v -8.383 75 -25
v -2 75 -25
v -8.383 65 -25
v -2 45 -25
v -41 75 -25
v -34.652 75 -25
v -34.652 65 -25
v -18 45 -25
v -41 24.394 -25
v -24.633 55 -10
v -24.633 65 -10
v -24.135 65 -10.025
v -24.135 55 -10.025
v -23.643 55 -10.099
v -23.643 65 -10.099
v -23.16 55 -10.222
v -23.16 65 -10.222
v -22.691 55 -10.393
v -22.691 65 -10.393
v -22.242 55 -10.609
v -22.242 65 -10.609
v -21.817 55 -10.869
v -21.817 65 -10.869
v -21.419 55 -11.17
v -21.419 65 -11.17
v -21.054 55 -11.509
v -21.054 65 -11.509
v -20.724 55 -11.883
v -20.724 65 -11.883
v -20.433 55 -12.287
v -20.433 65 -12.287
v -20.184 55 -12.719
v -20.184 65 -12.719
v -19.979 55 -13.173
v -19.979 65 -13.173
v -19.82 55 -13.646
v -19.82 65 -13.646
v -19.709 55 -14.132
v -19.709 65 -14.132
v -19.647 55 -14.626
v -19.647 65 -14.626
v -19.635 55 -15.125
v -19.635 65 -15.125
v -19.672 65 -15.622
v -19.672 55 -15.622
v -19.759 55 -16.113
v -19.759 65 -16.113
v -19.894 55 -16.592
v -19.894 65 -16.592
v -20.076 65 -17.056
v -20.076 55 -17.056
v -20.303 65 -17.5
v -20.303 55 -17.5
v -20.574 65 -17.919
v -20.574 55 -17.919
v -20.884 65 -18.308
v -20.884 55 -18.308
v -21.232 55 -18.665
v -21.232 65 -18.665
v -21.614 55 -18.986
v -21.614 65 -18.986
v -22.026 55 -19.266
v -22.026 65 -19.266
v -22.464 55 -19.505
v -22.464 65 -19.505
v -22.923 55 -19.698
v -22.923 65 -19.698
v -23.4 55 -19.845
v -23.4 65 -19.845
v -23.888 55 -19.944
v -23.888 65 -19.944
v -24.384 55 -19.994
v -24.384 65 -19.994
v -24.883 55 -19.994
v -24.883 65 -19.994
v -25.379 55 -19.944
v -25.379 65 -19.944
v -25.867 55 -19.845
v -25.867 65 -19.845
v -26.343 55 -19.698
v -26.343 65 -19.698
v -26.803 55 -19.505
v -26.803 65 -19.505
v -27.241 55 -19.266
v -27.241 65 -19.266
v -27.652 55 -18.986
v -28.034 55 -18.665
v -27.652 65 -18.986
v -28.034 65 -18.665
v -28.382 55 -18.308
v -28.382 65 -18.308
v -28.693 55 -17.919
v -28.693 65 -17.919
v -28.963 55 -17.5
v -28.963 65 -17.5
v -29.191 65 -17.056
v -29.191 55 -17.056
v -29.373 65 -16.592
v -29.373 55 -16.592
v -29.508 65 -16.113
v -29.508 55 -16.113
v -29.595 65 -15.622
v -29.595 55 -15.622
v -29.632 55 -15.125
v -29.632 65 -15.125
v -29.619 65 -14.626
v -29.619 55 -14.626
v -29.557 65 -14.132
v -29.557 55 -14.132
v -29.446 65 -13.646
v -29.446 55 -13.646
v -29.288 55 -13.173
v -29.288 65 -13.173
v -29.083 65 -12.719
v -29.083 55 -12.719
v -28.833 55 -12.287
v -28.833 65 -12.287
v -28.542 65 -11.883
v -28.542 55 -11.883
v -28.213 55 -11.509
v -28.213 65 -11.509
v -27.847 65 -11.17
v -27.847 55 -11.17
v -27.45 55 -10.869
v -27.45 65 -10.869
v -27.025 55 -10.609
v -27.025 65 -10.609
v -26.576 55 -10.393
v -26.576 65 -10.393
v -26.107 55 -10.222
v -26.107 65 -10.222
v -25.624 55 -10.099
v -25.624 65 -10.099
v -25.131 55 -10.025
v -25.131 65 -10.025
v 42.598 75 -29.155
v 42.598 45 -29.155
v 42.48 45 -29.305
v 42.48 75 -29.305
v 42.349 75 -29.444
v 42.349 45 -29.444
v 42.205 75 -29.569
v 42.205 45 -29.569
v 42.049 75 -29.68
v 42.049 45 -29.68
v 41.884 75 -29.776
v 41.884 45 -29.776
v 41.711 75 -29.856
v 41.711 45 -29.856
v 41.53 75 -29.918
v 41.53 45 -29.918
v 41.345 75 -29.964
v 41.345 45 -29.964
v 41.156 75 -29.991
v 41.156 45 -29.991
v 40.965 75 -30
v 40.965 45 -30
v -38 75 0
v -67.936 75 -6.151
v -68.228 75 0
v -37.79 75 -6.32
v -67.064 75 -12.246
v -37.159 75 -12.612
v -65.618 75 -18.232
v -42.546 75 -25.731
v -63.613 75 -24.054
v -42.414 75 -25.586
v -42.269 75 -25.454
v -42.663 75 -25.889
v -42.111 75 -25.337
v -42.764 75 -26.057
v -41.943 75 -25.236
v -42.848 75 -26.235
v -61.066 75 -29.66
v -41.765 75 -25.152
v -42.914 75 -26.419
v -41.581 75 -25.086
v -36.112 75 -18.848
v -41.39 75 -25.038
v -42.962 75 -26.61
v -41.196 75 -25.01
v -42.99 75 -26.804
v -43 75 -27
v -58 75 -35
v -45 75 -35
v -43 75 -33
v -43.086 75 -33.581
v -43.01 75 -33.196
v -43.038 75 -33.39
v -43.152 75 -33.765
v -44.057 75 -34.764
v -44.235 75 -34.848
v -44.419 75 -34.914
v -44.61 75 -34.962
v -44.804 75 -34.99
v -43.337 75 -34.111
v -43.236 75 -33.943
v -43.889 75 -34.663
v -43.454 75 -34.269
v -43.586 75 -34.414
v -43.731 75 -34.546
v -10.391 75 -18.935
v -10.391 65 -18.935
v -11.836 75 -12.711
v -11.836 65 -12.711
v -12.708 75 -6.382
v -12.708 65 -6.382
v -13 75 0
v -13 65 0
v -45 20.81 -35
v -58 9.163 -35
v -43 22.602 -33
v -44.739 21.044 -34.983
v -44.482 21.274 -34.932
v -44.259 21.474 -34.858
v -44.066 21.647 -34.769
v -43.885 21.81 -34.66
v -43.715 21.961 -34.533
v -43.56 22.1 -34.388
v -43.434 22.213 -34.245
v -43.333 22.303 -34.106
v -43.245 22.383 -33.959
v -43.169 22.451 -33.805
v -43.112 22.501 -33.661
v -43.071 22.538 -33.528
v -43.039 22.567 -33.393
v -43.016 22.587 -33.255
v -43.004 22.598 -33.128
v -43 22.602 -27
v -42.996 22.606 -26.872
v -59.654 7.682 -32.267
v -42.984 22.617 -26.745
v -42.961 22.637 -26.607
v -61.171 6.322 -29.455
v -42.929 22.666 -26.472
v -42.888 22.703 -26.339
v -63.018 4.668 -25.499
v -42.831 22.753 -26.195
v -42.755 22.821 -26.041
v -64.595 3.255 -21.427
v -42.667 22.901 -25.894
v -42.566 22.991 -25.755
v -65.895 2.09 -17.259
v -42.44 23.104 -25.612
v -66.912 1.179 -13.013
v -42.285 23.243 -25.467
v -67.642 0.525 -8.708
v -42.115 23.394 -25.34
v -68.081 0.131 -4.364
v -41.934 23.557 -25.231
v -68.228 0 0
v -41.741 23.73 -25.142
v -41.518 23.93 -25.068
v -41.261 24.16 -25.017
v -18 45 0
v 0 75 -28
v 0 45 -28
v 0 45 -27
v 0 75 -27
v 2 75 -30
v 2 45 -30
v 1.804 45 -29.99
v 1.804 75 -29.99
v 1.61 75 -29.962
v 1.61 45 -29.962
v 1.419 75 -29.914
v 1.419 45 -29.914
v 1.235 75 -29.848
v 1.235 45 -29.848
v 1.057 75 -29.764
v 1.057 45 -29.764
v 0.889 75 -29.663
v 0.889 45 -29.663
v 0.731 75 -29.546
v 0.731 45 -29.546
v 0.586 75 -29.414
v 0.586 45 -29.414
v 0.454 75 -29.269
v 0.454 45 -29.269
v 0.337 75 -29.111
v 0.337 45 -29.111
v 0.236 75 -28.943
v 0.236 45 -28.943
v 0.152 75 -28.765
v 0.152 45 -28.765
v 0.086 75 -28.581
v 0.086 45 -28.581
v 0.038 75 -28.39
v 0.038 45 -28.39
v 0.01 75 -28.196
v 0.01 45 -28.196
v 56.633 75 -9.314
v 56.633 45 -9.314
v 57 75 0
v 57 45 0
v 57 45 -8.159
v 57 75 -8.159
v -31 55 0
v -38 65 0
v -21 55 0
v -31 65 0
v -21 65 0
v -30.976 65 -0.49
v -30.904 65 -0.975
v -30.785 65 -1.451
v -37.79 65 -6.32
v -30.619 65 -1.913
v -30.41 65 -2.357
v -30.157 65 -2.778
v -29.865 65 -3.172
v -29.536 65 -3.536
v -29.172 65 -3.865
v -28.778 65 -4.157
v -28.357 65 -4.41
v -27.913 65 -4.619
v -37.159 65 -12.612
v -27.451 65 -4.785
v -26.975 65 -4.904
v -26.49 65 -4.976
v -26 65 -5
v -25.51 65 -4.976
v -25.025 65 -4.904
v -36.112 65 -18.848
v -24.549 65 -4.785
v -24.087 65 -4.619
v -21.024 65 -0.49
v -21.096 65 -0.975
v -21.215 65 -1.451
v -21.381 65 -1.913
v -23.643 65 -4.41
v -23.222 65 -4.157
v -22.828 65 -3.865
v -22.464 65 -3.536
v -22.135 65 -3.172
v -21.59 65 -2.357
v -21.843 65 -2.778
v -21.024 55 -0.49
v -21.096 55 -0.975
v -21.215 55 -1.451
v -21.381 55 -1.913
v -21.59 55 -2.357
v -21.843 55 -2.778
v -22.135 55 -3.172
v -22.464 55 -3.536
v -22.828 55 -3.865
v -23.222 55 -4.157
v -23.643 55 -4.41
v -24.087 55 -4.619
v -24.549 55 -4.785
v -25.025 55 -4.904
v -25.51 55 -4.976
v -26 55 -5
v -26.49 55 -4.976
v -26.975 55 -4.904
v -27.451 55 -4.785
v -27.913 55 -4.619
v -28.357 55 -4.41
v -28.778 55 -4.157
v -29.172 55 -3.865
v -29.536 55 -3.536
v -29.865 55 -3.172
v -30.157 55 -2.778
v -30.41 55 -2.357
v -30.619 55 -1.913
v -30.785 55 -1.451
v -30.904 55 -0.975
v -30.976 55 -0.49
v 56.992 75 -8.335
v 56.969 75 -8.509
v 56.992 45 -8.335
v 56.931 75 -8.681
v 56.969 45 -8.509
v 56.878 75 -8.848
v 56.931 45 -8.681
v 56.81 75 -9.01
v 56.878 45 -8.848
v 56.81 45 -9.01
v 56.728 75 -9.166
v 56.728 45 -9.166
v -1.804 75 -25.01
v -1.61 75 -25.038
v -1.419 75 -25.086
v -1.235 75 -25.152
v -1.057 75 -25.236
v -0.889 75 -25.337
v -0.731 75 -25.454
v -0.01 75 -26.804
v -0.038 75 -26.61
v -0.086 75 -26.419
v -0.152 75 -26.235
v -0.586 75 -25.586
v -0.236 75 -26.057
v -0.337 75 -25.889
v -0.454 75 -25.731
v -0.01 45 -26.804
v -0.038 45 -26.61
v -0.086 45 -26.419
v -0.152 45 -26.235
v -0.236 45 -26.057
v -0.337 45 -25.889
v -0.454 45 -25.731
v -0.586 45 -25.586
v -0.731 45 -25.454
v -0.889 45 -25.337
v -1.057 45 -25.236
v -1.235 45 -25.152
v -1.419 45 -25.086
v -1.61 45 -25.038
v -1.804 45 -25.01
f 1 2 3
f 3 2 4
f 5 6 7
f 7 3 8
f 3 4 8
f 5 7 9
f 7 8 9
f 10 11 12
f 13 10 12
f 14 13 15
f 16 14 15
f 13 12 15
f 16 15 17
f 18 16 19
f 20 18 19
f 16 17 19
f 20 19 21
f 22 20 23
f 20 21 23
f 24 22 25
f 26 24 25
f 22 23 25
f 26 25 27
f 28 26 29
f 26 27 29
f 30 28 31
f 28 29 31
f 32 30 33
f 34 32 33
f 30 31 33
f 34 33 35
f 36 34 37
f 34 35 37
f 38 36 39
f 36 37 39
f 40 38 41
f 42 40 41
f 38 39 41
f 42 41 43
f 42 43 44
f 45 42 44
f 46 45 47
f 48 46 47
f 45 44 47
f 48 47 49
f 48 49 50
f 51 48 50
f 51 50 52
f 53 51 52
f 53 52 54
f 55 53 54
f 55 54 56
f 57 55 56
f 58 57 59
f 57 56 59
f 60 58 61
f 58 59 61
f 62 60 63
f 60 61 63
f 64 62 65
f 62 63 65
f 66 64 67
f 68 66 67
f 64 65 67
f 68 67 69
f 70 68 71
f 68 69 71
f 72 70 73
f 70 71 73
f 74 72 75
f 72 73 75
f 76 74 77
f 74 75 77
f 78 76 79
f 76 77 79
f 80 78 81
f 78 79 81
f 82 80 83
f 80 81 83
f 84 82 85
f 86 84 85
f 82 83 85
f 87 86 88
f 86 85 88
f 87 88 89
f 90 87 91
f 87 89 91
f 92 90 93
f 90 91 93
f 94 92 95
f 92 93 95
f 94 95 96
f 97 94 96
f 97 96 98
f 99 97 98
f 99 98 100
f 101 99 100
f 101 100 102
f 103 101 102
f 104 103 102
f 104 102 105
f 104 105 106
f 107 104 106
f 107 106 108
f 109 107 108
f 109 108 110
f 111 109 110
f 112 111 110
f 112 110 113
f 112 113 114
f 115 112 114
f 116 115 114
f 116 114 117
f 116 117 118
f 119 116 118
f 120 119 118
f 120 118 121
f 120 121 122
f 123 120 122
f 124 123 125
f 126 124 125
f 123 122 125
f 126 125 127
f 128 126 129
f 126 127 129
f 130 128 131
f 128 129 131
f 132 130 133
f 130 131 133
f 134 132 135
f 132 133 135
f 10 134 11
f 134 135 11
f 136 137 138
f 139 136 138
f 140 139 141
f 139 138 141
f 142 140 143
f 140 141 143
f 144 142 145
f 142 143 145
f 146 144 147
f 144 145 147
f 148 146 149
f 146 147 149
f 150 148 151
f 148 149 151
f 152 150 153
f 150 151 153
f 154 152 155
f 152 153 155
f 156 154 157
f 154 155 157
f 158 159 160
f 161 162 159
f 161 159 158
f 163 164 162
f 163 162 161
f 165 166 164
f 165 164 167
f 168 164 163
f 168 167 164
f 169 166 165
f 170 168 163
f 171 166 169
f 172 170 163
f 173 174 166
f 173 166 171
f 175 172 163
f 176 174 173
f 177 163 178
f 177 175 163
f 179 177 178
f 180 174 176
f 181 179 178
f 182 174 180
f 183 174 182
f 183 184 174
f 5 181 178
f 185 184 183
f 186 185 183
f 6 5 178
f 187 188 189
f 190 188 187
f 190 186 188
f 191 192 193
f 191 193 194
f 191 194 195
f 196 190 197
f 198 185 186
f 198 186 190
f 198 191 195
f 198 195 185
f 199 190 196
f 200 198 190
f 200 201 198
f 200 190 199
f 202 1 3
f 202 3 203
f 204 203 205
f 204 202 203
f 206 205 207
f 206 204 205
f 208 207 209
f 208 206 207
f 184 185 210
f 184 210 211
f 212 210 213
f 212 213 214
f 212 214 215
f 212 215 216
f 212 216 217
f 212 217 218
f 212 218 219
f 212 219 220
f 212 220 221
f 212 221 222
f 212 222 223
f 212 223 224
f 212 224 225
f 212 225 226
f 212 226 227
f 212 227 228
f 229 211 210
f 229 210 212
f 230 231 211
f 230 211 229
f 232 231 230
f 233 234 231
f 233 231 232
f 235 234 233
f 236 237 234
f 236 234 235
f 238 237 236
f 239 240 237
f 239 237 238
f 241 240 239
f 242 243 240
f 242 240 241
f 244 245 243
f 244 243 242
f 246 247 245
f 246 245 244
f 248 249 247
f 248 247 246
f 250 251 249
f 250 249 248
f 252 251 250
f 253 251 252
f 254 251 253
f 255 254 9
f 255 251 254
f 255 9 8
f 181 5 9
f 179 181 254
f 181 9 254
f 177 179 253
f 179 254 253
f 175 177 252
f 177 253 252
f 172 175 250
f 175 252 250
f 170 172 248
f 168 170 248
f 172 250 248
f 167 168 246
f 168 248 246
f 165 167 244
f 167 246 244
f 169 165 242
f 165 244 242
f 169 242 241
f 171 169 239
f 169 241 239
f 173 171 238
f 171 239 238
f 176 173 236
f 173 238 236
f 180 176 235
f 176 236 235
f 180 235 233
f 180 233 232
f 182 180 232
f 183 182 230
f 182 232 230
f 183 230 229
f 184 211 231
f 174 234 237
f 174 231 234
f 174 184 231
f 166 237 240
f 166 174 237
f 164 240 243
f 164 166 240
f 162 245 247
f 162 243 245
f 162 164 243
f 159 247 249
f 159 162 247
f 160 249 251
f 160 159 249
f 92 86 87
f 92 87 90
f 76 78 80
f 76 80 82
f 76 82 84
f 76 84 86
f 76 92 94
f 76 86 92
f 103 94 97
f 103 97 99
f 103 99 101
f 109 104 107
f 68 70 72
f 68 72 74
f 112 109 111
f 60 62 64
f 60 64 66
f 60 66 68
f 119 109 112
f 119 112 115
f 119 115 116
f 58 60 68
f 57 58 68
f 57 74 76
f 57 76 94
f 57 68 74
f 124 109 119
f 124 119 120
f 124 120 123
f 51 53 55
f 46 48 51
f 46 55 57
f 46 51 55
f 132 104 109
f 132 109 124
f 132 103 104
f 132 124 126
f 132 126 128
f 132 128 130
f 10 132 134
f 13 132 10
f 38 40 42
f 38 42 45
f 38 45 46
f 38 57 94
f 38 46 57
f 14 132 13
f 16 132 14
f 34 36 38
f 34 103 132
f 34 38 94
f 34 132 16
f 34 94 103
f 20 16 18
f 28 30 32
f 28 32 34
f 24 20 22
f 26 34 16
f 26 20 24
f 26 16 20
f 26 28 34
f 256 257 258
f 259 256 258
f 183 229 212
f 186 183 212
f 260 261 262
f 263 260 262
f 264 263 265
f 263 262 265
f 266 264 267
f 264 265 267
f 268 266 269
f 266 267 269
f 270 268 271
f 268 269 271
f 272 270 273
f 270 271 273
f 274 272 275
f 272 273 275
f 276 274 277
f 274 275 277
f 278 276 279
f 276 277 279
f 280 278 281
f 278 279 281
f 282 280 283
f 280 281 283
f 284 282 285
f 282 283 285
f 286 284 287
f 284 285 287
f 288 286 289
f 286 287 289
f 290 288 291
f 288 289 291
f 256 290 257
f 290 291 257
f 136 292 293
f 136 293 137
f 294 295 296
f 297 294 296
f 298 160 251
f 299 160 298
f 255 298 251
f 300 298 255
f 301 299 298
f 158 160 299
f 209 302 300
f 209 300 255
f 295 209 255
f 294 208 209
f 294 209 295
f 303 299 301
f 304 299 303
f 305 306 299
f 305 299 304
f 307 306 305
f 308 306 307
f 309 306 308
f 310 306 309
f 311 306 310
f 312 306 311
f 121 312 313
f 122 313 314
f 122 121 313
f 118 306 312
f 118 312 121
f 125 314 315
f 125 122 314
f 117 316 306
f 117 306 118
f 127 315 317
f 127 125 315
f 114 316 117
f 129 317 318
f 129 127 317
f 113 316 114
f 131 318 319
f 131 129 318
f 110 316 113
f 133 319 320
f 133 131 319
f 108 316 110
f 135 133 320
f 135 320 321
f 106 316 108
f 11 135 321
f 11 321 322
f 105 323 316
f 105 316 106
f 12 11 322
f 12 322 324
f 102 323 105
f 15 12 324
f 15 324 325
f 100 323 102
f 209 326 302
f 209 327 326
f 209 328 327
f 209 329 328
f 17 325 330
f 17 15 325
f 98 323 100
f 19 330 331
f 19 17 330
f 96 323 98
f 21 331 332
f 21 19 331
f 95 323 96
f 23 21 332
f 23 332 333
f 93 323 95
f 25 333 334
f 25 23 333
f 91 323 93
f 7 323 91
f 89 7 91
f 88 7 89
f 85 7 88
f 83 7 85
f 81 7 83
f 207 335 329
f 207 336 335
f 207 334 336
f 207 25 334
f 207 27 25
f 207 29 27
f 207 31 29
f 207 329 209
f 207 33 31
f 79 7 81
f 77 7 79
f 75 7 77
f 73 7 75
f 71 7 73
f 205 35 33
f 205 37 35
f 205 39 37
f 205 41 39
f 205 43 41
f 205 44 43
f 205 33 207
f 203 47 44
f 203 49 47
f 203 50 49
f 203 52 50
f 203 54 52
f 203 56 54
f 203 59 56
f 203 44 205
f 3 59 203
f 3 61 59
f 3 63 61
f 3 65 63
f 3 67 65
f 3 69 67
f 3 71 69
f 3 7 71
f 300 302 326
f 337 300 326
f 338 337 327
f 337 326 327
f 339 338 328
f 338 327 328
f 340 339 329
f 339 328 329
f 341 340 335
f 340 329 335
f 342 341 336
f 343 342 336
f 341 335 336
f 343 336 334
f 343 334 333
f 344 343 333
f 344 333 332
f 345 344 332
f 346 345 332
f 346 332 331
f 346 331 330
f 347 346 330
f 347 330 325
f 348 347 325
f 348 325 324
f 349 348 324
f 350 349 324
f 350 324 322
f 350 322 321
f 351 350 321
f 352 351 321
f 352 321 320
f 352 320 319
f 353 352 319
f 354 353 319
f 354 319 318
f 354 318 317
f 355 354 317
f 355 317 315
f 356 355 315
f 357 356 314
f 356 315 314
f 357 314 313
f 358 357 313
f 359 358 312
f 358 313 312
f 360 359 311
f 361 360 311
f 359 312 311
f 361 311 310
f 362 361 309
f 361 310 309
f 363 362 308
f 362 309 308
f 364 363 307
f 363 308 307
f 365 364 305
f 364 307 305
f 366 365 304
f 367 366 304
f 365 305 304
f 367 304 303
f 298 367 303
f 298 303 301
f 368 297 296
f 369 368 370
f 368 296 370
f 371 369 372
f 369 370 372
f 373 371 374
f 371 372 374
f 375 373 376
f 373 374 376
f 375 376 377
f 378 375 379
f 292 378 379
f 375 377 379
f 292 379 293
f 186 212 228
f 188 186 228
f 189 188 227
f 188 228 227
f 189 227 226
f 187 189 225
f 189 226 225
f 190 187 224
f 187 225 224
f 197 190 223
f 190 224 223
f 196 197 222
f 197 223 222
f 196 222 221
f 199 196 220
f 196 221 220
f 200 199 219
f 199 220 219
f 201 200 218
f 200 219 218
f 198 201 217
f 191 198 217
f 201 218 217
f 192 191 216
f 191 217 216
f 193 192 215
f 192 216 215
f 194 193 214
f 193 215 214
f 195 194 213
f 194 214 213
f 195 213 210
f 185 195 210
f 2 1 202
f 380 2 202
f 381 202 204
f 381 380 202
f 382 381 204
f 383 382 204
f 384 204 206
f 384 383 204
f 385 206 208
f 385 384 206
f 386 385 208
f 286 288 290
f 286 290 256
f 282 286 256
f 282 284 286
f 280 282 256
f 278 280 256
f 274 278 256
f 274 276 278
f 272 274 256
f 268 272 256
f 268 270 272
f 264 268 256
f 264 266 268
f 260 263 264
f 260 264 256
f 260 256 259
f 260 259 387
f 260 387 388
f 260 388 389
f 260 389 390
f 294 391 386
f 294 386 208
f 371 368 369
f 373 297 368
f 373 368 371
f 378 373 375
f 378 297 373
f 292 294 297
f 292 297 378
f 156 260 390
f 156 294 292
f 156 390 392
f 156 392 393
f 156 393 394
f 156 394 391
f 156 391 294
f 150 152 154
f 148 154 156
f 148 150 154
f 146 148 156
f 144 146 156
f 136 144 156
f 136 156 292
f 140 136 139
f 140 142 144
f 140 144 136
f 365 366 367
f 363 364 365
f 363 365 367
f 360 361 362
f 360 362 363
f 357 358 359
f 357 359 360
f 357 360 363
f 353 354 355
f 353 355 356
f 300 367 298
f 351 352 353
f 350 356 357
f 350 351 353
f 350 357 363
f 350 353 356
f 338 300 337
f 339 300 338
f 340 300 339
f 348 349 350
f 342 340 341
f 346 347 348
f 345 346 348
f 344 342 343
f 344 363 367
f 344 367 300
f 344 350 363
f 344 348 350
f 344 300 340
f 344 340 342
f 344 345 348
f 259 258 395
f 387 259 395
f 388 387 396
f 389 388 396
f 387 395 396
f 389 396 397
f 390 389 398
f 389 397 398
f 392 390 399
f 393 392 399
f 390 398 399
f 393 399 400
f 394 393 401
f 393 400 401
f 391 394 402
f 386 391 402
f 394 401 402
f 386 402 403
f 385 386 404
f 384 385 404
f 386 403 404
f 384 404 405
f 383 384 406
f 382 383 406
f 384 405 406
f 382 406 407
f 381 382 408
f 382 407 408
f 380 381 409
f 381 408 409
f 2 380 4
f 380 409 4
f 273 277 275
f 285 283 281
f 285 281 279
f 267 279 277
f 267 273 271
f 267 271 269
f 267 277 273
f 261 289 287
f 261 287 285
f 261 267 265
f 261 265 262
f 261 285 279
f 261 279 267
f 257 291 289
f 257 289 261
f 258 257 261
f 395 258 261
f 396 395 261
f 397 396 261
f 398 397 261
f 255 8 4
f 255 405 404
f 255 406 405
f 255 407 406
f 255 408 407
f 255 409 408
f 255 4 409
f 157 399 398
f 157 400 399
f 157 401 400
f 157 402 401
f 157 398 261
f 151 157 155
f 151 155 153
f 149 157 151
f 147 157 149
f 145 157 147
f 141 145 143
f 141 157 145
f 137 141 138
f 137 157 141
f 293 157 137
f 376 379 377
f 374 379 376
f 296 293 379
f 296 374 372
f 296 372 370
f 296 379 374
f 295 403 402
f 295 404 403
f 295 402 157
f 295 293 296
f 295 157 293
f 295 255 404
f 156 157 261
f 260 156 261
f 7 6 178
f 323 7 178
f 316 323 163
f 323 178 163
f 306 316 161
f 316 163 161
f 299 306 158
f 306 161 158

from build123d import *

# Parameters (mm, degrees)
BOSS_EXTRUDE1_DEPTH = 75
SKETCH8_R           = 95
SKETCH8_R_2         = 70
CUT_EXTRUDE6_DEPTH  = 10
SKETCH9_R           = 5
CUT_EXTRUDE7_DEPTH  = 10
BOSS_EXTRUDE2_DEPTH = 75
CUT_EXTRUDE10_DEPTH = 108.26147997


with BuildPart() as part:
    # Sketch1 → Boss-Extrude1 (new body)
    with BuildSketch(Plane(origin=(0, 0, 0), x_dir=(1, 0, 0), z_dir=(0, 1, 0))):
        with BuildLine():
            Line((-58, 0), (57, 0))
            Line((57, 0), (57, 8.158918194))
            ThreePointArc((57, 8.158918194), (56.905987413, 8.764898378), (56.632788017, 9.313908796))
            Line((56.632788017, 9.313908796), (42.597737063, 29.154990602))
            ThreePointArc((42.597737063, 29.154990602), (41.884192973, 29.776229321), (40.964949045, 30))
            Line((40.964949045, 30), (2, 30))
            ThreePointArc((2, 30), (0.585786438, 29.414213562), (0, 28))
            Line((0, 28), (0, 27))
            ThreePointArc((0, 27), (-0.585786438, 25.585786438), (-2, 25))
            Line((-2, 25), (-41, 25))
            ThreePointArc((-41, 25), (-42.414213562, 25.585786438), (-43, 27))
            Line((-43, 27), (-43, 33))
            ThreePointArc((-43, 33), (-43.585786438, 34.414213562), (-45, 35))
            Line((-45, 35), (-58, 35))
            Line((-58, 35), (-58, 0))
        make_face()
    extrude(amount=BOSS_EXTRUDE1_DEPTH)

    # Sketch8 → Cut-Extrude6 (cut)
    with BuildSketch(Plane(origin=(0, 75, 0), x_dir=(1, 0, 0), z_dir=(0, 1, 0))):
        with Locations((57, 0)):
            Circle(SKETCH8_R)
        with Locations((57, 0)):
            Circle(SKETCH8_R_2, mode=Mode.SUBTRACT)
    extrude(amount=-CUT_EXTRUDE6_DEPTH, mode=Mode.SUBTRACT)

    # Sketch9 → Cut-Extrude7 (cut)
    with BuildSketch(Plane(origin=(0, 65, 0), x_dir=(1, 0, 0), z_dir=(0, 1, 0))):
        with Locations((-26, 0)):
            Circle(SKETCH9_R)
        with Locations(Location((-24.633326528, 15, 0), (0, 0, 270))):
            Circle(SKETCH9_R)
    extrude(amount=-CUT_EXTRUDE7_DEPTH, mode=Mode.SUBTRACT)

    # Sketch11 → Boss-Extrude2 (add)
    with BuildSketch(Plane(origin=(0, 75, 0), x_dir=(1, 0, 0), z_dir=(0, 1, 0))):
        with BuildLine():
            Line((-68.227744249, 0), (-58, 0))
            Line((-58, 0), (-58, 35))
            ThreePointArc((-58, 35), (-65.618435157, 18.231886576), (-68.227744249, 0))
        make_face()
    extrude(amount=-BOSS_EXTRUDE2_DEPTH)

    # Sketch12 → Cut-Extrude10 (cut, through all)
    with BuildSketch(Plane.XY):
        Polygon((57, 0), (-68.227744249, 0), (-18, 45), (57, 45), align=None)
    extrude(amount=-CUT_EXTRUDE10_DEPTH, mode=Mode.SUBTRACT)


solid = part.part
